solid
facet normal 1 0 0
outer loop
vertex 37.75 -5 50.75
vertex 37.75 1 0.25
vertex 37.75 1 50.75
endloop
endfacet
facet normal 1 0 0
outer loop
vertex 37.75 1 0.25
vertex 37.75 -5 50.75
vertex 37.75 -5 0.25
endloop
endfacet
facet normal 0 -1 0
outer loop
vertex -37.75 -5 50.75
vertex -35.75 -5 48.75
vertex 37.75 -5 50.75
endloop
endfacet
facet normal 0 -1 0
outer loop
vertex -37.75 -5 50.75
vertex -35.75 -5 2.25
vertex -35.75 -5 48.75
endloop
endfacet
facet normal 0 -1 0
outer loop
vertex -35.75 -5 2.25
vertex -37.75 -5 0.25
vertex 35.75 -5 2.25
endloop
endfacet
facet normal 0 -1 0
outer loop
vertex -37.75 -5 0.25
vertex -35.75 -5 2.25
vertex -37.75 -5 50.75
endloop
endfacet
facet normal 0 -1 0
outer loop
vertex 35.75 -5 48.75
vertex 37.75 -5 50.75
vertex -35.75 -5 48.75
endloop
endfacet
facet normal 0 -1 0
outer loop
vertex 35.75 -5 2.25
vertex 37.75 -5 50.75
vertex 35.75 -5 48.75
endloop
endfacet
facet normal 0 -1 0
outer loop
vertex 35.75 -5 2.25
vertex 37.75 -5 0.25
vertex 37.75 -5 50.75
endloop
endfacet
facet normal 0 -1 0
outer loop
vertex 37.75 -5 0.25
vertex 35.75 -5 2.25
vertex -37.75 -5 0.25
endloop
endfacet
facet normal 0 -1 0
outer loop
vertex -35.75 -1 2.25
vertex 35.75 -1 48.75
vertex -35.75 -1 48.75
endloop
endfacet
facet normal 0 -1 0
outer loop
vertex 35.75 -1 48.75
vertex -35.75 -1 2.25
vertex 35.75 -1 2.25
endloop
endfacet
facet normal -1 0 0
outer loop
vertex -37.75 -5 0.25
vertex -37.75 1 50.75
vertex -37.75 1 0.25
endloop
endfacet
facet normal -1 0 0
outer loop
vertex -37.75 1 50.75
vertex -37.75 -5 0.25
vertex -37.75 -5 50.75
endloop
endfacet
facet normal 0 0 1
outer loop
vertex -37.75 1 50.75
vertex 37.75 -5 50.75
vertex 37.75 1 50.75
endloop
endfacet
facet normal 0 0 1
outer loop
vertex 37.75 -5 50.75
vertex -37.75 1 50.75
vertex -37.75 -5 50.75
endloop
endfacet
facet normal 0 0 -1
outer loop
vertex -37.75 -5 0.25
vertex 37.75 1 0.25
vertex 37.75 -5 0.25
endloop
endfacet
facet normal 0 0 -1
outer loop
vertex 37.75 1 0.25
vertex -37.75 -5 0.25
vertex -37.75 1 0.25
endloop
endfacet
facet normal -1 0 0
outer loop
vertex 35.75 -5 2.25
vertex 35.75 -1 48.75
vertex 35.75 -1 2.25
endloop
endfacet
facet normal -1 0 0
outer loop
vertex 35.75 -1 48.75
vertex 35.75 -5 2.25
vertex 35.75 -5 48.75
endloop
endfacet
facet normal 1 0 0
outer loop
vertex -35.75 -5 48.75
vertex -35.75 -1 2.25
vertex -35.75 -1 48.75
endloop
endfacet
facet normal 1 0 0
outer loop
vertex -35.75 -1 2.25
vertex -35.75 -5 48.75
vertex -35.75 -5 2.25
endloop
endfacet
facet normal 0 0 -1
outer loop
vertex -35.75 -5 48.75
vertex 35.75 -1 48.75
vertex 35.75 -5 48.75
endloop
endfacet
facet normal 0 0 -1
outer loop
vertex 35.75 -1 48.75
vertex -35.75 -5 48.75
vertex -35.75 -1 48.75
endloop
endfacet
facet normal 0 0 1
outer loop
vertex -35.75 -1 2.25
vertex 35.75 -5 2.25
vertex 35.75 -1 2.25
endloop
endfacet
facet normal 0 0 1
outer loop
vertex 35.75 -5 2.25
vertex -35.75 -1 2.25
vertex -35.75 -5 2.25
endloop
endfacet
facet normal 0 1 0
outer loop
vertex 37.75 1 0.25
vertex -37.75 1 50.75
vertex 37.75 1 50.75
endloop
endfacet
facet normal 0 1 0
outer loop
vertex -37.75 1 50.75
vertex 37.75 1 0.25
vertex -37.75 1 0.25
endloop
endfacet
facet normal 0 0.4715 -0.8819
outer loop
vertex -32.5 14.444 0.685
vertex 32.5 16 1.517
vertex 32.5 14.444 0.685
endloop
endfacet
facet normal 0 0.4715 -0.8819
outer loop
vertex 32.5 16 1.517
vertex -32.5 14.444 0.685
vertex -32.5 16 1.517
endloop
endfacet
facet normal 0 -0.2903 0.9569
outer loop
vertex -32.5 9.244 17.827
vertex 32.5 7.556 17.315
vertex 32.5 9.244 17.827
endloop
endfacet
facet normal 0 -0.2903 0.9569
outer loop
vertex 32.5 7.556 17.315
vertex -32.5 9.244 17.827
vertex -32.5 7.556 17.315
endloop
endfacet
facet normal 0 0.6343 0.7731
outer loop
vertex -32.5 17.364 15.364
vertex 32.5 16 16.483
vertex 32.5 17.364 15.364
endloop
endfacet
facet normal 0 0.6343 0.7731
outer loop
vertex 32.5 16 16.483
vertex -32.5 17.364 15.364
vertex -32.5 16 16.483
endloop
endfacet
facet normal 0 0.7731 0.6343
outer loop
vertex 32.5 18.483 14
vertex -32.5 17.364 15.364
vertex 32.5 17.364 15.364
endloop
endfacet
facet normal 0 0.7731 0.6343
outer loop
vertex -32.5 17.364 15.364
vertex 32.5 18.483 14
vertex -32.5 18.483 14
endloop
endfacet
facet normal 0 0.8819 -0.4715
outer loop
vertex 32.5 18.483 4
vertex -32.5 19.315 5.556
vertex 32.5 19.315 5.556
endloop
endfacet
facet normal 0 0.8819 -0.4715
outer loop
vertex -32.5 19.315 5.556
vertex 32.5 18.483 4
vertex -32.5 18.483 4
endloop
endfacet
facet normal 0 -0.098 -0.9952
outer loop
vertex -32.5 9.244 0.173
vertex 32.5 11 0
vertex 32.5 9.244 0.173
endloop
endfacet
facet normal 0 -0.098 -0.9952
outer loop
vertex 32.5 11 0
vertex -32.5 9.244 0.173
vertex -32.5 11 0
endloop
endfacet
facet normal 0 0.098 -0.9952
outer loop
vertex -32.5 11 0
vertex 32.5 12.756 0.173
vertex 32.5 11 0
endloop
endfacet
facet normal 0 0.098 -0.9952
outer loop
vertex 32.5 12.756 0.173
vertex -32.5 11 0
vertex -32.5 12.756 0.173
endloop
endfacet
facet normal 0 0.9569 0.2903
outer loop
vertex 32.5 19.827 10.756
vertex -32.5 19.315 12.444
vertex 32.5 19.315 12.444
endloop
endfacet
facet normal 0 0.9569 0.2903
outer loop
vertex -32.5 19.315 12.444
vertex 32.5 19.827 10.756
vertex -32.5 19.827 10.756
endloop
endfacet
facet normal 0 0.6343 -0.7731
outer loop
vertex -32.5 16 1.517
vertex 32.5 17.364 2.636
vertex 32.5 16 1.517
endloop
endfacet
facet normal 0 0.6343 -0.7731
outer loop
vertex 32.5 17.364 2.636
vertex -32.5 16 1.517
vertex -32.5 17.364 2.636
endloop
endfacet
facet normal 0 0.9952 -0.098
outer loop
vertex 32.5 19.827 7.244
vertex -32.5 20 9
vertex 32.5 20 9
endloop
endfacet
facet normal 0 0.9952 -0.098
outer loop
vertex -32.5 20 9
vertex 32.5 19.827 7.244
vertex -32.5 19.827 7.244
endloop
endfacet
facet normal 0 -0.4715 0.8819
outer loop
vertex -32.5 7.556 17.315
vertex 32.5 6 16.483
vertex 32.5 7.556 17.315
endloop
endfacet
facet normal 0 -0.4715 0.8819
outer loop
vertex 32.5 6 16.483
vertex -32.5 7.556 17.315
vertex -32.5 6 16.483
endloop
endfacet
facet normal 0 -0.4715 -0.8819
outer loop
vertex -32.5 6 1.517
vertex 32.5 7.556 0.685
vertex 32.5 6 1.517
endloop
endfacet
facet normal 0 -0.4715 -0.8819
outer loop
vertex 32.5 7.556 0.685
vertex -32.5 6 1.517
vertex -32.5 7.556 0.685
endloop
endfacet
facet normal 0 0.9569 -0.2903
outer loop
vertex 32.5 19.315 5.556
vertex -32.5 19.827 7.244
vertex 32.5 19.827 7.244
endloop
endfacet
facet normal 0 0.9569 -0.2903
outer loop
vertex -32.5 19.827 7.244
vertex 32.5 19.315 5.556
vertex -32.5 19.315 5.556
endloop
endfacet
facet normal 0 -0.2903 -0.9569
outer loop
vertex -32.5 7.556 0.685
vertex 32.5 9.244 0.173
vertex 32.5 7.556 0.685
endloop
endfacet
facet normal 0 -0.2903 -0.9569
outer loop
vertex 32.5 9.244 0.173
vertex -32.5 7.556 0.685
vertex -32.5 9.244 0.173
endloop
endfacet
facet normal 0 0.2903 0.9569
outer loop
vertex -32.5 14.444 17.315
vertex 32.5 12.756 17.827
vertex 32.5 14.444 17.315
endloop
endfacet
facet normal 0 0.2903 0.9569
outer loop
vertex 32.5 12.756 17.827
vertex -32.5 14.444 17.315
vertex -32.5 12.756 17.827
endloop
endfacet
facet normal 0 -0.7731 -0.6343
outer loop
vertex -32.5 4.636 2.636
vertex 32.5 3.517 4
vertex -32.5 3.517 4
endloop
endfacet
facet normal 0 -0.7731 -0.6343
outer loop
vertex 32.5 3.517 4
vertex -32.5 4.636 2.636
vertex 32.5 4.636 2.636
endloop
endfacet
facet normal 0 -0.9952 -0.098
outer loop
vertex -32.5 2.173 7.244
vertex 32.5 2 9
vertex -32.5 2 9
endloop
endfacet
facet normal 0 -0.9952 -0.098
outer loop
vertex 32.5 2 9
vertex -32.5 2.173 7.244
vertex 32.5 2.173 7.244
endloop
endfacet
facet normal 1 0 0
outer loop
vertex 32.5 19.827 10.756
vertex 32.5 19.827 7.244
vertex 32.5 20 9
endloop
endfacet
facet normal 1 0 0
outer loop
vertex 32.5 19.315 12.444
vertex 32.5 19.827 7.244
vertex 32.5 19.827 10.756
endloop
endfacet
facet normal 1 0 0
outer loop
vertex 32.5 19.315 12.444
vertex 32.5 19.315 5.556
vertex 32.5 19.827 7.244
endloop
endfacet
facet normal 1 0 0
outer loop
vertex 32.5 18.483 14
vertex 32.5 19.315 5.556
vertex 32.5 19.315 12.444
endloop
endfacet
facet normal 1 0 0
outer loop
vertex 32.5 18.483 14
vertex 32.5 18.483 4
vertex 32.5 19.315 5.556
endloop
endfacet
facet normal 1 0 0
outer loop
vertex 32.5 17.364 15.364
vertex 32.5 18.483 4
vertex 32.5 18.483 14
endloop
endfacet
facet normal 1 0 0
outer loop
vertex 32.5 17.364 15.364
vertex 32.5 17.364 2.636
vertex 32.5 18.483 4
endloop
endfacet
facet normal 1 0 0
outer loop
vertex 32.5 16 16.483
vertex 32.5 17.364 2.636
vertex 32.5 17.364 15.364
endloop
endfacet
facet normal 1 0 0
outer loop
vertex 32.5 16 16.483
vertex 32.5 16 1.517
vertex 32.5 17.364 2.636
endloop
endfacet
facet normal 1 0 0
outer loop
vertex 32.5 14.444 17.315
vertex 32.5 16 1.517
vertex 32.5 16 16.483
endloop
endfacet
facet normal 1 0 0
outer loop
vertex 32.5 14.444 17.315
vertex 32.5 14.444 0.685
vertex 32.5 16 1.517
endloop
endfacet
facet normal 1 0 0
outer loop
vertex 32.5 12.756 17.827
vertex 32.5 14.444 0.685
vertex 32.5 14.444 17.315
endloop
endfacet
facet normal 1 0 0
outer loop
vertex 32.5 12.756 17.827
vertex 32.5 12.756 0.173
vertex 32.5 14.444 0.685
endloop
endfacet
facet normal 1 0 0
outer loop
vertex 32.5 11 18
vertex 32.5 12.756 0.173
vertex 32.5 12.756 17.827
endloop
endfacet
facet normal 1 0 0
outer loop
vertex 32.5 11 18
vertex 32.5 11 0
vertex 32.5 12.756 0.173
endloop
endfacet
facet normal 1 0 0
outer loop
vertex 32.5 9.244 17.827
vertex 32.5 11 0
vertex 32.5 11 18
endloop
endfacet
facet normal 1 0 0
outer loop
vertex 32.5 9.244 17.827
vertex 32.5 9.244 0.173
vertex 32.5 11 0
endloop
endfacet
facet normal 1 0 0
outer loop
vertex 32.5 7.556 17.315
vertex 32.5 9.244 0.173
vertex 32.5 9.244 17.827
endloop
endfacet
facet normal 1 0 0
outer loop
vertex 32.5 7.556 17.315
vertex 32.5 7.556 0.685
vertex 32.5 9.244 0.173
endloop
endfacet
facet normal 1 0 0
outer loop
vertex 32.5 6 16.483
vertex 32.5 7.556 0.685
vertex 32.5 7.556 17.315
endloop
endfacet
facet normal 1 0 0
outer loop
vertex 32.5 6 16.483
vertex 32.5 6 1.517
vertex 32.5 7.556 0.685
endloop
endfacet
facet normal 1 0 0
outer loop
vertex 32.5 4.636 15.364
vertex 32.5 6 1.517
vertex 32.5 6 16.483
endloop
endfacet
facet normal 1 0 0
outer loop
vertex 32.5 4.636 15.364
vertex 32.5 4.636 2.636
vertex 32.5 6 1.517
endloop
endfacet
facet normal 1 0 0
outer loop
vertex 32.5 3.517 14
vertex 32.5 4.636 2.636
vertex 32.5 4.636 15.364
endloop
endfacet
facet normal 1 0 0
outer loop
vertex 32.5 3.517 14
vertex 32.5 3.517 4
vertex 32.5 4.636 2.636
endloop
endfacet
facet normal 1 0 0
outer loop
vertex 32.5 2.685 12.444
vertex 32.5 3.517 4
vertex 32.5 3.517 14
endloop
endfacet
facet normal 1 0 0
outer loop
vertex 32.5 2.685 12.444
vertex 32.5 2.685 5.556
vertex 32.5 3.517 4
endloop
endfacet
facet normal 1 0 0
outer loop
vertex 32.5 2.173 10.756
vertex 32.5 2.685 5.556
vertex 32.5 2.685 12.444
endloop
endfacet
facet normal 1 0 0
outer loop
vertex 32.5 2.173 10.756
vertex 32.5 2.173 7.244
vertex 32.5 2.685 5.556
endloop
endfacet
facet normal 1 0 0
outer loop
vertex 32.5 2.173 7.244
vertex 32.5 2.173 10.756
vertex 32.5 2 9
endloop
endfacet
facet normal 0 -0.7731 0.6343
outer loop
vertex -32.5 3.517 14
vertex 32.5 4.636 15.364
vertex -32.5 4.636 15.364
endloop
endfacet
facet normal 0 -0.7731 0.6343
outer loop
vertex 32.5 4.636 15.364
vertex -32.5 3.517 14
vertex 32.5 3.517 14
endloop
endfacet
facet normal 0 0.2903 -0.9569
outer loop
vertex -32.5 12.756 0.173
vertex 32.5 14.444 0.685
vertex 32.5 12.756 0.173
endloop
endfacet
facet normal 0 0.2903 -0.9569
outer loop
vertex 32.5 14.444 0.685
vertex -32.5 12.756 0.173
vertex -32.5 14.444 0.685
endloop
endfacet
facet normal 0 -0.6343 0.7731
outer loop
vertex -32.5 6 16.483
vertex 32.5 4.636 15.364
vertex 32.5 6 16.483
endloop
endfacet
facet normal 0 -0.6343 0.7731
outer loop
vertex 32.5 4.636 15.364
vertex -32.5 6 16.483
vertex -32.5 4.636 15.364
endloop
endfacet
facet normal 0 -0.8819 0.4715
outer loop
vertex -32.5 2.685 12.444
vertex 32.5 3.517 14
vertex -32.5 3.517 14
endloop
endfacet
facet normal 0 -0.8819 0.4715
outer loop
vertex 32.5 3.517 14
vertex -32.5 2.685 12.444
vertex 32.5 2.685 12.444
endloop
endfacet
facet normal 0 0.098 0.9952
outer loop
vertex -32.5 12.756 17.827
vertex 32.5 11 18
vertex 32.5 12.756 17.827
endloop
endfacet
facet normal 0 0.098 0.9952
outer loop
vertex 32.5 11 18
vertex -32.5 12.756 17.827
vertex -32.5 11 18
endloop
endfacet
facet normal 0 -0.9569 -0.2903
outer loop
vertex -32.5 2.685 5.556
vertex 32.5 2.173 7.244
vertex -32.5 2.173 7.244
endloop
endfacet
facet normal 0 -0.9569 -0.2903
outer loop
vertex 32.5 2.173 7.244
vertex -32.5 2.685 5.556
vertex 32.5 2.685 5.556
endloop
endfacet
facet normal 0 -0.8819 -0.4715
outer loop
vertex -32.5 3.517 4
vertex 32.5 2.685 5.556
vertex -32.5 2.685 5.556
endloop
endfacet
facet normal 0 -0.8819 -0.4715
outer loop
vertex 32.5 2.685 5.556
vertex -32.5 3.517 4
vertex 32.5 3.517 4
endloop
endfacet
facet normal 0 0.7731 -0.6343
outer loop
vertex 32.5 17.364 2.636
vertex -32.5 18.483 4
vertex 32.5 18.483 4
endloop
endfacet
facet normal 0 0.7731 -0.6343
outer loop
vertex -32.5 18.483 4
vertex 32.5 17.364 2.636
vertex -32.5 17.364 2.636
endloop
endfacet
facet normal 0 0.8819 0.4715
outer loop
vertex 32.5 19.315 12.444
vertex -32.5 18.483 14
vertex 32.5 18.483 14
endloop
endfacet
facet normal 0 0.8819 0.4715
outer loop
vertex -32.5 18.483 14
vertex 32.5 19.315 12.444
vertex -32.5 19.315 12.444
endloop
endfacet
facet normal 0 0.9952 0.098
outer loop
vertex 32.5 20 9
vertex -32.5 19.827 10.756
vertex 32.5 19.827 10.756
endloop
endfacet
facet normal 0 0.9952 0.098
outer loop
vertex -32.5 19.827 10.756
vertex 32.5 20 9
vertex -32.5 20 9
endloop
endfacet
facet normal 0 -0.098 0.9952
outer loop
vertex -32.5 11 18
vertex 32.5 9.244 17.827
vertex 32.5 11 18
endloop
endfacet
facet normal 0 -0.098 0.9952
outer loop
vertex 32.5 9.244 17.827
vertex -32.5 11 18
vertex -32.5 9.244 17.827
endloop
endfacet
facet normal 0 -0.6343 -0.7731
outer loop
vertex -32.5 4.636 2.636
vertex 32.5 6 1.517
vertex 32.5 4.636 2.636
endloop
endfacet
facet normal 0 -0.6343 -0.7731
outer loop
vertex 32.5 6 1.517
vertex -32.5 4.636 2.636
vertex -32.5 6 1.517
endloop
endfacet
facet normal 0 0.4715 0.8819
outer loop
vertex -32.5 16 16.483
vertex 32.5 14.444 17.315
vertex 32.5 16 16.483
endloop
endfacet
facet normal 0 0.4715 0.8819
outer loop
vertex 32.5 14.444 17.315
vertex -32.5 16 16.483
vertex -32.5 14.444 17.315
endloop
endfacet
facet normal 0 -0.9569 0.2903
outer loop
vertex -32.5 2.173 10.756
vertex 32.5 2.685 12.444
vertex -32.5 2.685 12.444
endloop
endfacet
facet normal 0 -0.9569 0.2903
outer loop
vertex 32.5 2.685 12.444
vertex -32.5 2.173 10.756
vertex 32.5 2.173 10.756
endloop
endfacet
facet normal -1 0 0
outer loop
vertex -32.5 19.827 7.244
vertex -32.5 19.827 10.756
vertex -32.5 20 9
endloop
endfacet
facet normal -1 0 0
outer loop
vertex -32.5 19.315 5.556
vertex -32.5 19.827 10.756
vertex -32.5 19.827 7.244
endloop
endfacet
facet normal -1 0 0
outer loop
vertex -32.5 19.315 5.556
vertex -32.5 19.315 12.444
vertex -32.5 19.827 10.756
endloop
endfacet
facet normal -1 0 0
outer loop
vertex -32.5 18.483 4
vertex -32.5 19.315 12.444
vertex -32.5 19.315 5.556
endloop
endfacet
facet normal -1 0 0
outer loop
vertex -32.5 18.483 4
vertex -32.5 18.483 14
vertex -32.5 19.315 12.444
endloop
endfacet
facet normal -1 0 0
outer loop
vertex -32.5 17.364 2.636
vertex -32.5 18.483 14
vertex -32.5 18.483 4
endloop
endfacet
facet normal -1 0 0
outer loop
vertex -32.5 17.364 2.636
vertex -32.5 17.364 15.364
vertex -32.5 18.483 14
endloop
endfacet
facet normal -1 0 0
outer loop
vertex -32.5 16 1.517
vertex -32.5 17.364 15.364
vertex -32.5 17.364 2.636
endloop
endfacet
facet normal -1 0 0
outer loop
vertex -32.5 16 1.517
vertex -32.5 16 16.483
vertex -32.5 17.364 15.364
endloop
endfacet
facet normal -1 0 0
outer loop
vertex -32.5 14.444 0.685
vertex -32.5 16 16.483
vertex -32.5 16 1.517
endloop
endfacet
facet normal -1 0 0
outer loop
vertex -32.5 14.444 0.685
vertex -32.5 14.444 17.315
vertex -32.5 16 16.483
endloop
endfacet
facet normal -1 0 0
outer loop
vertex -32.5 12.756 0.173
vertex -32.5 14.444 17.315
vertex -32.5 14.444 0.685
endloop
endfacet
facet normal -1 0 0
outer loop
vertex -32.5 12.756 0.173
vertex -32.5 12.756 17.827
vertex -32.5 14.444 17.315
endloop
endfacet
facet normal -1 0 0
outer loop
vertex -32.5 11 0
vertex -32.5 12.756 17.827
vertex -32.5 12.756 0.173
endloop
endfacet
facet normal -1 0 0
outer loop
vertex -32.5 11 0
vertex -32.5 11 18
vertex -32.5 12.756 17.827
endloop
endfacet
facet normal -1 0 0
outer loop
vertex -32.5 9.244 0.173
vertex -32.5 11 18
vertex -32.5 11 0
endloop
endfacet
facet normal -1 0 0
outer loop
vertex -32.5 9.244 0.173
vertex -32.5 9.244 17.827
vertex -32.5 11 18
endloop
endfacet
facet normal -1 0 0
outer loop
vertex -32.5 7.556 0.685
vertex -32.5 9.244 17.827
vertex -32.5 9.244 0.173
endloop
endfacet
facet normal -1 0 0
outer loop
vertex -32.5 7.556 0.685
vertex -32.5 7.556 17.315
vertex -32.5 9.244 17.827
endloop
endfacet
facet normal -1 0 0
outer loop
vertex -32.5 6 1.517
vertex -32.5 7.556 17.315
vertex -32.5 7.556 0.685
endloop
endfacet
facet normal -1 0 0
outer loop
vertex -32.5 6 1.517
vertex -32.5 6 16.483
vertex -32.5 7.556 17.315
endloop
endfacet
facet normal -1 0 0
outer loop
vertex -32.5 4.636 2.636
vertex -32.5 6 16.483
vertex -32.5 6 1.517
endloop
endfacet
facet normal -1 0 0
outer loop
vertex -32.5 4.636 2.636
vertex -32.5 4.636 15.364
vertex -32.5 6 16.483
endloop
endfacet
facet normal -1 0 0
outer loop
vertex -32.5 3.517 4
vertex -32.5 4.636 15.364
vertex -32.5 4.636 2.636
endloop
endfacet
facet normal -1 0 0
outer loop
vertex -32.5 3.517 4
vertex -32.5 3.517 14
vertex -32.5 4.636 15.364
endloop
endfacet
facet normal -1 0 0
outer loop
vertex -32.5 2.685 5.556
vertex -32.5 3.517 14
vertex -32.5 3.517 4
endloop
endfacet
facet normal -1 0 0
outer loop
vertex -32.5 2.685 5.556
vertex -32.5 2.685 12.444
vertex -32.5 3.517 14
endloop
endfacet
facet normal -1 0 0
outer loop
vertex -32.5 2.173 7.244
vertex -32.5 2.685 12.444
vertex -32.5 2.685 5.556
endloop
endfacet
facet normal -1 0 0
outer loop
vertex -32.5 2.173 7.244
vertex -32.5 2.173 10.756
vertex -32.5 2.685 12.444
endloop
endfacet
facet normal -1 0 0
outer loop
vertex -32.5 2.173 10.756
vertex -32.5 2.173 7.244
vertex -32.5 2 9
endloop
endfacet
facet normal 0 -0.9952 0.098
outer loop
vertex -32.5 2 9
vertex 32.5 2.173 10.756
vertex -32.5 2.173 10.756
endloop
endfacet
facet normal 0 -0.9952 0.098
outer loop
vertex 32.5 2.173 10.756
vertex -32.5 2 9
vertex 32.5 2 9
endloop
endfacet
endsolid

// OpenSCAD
// file: akkum_18650.scad
echo("Работа Асыловой Анастасии");

d_akkum = 18;
h_akkum = 65;

akkum18650();

module akkum18650(){
    color("purple")
    cylinder(d=d_akkum, h=h_akkum, $fn=32, center = true);
}
// main file
use <akkum_18650.scad>

echo("Работа Асыловой Анастасии!");
thickness_frame = 4;
thickness_walls = 2;
thickness_bottom = 2;

w_back = 70;
h_back = 45;
thickness_back = 1;
h_walls = 4;

d_akkum = 18;
h_akkum = 65;

gap_backlight = 1.5;

//rotate([90, 0, 0])
//translate([0,0,4])
//backlight();
//kit_frame();
//akkum18650();
build_frame();

module build_frame(){
    translate([0, 0, h_back/2+2*gap_backlight])
    rotate([90,0,0])
    kit_frame();
    translate([0,0,d_akkum/2])
    translate([0,d_akkum/2+thickness_bottom,0])
    rotate([0,90,0])
    akkum18650();
}

module kit_frame(){
    bottom();
    translate([0,0,h_walls/2+thickness_bottom/2])
    walls();
}
module walls(){
    difference(){
        cube([w_back+2*thickness_walls+gap_backlight, h_back+2*thickness_walls+gap_backlight, h_walls], center = true);
        color("red")
        cube([w_back+gap_backlight, h_back+gap_backlight, h_walls+1], center = true);
    }
}
module backlight(){
    color("lightgreen")
    cube([w_back, h_back, thickness_back], center = true);
}

module bottom(){
    cube([w_back+2*thickness_walls+gap_backlight, h_back+2*thickness_walls+gap_backlight, thickness_bottom], center = true);
}
